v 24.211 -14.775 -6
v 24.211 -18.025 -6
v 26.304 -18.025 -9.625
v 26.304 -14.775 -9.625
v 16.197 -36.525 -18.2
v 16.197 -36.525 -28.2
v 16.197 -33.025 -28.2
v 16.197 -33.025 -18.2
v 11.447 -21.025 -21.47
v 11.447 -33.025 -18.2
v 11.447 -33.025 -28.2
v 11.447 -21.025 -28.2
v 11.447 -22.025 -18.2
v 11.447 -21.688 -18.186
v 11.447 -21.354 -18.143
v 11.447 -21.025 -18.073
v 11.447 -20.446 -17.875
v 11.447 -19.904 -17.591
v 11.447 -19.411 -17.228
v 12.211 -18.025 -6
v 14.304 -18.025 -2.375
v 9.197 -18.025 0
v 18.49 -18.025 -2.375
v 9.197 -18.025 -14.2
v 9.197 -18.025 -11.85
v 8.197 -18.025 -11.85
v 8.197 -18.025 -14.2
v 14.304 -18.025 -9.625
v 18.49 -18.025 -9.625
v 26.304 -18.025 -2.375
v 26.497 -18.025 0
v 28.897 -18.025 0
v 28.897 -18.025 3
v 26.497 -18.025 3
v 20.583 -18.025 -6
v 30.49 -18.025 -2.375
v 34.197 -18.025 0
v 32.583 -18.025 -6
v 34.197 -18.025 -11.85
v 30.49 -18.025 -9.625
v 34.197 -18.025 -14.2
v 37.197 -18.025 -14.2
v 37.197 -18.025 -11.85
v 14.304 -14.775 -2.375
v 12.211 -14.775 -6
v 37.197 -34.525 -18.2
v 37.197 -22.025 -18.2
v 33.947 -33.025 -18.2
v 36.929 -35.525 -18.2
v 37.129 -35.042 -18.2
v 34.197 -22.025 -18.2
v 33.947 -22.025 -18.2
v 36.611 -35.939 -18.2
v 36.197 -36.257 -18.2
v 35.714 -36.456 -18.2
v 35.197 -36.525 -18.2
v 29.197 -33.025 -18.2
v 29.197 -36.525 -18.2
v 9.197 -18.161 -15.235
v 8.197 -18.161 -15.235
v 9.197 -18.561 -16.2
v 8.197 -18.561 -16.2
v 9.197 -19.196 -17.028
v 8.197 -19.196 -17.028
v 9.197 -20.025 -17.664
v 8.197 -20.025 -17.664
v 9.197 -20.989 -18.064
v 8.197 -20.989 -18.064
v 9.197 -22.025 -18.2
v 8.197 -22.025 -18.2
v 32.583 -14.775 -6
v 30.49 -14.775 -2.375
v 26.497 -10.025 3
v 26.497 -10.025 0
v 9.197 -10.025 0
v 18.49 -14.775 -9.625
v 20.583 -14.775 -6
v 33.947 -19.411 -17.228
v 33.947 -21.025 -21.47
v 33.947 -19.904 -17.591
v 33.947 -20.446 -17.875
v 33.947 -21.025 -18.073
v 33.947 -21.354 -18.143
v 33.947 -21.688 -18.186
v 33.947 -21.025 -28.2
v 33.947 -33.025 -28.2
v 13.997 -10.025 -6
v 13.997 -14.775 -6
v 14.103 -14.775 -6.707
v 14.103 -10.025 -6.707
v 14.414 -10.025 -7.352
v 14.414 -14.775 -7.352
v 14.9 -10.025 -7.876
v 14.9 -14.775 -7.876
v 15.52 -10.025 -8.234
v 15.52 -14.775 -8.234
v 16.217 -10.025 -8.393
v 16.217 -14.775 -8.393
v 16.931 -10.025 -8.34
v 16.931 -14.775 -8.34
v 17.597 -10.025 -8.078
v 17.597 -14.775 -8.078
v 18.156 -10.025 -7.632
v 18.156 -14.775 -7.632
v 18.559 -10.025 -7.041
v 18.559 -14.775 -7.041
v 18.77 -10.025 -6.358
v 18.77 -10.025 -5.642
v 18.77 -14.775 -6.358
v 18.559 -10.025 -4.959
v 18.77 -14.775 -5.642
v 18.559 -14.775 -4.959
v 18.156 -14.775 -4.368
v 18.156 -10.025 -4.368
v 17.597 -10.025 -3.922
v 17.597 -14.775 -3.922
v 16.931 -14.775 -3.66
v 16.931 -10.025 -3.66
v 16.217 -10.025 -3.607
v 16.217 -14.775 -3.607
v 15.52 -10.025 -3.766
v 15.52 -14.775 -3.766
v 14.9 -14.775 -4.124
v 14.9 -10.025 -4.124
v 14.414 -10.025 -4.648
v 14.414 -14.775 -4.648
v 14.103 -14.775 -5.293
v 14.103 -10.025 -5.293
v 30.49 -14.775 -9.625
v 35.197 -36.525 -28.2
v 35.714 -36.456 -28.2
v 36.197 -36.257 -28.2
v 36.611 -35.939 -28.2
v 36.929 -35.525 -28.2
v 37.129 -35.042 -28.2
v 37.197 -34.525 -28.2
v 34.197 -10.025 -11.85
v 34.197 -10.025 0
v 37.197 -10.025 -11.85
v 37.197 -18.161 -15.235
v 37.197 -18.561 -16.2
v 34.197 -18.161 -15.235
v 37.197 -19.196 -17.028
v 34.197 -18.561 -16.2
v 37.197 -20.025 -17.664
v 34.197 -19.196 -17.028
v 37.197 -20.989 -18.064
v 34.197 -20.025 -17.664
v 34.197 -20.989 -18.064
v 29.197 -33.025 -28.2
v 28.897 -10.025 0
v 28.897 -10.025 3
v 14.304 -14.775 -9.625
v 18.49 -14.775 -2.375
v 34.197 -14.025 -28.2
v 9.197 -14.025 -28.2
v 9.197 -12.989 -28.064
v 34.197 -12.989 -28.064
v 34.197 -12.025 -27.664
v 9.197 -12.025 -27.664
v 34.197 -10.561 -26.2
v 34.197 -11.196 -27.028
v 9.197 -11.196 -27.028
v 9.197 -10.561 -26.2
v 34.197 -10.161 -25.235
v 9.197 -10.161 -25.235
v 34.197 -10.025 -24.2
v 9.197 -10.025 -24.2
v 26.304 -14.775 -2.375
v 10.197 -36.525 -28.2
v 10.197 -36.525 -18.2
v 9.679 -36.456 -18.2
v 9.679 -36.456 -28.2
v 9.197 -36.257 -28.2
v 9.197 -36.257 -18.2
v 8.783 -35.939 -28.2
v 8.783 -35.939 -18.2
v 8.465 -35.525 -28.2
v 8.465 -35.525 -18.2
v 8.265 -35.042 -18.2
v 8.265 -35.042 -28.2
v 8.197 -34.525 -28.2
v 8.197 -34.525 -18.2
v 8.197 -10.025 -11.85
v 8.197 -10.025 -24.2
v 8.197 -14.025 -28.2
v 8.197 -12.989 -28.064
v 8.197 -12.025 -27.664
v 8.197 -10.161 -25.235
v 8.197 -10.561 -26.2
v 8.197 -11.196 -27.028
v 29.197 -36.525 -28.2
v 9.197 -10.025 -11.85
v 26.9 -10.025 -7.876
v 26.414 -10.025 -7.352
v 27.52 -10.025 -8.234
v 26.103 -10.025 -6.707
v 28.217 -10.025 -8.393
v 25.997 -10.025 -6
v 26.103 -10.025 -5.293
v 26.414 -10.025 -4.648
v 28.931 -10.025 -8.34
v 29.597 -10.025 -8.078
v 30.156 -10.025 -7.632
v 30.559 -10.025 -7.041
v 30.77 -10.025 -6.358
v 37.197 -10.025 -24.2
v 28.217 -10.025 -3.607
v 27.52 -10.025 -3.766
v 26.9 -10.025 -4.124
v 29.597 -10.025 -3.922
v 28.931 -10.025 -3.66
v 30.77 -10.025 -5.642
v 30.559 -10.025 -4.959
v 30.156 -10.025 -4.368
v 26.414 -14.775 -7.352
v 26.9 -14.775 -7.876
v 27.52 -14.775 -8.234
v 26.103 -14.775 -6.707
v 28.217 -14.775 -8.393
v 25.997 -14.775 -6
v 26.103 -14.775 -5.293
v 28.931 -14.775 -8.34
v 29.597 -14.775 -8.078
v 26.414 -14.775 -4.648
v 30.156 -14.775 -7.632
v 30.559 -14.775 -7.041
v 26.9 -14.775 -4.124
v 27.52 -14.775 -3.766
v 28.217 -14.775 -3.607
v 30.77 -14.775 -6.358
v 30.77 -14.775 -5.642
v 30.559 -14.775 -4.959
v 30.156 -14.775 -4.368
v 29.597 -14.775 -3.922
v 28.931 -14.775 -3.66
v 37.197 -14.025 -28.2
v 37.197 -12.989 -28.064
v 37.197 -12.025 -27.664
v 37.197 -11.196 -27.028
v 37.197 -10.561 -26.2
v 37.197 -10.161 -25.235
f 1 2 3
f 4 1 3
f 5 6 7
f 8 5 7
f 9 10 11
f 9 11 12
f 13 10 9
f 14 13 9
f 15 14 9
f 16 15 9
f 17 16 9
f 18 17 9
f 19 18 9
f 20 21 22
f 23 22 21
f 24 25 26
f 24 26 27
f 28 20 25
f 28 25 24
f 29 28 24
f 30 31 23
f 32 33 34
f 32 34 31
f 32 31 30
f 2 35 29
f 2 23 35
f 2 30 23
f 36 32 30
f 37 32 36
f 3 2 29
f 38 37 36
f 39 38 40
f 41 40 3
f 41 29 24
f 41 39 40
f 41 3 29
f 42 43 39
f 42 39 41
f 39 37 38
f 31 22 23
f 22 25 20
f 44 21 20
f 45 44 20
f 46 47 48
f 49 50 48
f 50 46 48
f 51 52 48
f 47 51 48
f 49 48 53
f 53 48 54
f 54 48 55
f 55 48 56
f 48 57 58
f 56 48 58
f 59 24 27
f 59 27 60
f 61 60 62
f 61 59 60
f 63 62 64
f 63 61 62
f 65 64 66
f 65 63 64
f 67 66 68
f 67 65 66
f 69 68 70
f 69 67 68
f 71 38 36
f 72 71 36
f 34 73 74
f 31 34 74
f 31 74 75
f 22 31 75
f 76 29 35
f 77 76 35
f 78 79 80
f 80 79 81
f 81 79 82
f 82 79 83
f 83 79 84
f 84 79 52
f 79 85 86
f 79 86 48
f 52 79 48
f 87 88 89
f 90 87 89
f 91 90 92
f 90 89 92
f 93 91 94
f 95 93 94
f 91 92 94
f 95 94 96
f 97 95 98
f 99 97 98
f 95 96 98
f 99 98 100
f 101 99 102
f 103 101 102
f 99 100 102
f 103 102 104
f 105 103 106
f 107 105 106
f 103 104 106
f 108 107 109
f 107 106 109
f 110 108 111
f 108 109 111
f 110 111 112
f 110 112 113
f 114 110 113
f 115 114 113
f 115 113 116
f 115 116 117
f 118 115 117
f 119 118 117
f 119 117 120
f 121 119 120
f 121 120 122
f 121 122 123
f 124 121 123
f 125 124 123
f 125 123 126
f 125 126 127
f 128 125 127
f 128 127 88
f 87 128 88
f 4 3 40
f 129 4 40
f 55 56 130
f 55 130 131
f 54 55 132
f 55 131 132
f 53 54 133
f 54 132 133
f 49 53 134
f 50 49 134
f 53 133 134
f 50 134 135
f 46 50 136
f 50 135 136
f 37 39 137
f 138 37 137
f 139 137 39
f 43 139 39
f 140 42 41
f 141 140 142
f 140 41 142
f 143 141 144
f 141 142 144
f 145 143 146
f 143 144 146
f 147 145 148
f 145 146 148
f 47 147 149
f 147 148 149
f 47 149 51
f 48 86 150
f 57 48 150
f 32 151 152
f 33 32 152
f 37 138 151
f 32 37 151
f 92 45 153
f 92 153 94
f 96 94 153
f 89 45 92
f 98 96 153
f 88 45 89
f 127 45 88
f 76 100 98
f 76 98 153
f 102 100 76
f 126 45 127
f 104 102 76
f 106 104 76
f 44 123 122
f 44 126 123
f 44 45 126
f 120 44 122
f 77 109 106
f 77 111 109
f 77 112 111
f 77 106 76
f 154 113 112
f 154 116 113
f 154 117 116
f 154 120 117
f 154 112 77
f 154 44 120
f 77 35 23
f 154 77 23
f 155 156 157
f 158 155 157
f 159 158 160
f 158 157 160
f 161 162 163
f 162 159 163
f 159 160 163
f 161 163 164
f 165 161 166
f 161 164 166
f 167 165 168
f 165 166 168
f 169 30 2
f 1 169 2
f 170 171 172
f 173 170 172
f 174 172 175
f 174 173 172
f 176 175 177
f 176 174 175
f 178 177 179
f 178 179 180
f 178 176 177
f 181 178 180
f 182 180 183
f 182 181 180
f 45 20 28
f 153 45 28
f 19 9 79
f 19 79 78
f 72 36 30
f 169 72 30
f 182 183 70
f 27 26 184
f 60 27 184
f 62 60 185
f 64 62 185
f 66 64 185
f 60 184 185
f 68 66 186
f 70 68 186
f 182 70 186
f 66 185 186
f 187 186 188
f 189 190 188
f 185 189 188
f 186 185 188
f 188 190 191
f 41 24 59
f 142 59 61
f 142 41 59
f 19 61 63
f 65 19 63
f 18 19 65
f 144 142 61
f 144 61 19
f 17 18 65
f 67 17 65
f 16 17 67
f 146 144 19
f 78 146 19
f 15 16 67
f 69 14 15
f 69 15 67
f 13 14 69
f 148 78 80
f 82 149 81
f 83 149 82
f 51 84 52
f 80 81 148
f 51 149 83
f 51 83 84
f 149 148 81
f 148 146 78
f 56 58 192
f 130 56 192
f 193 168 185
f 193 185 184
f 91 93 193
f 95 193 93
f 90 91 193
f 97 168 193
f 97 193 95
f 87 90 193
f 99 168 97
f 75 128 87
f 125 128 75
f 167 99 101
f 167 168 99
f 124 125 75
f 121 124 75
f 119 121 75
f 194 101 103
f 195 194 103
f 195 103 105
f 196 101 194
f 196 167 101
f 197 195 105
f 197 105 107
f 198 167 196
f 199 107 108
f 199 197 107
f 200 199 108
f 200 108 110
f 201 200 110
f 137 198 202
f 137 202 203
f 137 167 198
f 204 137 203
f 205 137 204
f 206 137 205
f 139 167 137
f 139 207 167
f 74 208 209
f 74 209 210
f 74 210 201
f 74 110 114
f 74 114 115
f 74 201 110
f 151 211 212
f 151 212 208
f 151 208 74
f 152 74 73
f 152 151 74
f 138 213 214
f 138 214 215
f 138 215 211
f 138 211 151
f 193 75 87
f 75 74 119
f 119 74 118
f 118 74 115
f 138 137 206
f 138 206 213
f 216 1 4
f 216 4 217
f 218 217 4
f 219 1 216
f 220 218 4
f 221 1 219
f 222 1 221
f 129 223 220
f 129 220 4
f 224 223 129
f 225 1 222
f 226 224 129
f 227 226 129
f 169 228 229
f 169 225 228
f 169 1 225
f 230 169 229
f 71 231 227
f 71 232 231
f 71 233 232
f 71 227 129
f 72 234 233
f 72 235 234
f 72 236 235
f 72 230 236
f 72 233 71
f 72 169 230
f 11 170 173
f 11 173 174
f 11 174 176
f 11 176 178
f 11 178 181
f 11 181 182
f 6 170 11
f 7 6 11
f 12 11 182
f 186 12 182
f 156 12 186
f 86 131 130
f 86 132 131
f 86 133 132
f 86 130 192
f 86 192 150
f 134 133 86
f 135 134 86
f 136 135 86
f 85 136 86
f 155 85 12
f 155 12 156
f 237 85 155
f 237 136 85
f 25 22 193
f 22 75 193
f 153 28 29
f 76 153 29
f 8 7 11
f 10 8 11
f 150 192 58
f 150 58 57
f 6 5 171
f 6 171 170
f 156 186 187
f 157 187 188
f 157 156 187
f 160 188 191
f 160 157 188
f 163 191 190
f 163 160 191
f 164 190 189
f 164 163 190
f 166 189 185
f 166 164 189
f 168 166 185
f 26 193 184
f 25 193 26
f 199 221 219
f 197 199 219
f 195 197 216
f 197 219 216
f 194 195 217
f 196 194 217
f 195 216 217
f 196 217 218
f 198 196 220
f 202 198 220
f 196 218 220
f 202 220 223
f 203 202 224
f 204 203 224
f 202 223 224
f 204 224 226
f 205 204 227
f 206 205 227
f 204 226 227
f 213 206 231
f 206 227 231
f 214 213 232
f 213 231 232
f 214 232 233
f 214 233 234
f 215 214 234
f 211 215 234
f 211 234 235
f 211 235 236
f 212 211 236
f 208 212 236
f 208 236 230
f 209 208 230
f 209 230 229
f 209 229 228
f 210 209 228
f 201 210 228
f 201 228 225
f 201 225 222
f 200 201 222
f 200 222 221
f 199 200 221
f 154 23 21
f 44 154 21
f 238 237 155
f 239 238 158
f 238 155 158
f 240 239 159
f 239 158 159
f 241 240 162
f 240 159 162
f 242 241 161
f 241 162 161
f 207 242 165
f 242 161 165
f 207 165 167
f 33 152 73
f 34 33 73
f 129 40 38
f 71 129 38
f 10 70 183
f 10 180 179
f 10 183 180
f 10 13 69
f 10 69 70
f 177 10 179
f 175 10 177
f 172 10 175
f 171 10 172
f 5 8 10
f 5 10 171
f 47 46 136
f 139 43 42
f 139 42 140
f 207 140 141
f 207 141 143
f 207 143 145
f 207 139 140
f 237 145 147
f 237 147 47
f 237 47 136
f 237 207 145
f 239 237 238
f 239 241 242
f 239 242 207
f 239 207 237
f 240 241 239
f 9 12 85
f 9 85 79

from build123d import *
from OCP.BRepFilletAPI import BRepFilletAPI_MakeChamfer
from build123d.topology import SkipClean

# Parameters (mm, degrees)
SKETCH1_R                      = 3.1
SKETCH1_R_2                    = 3.5
SKETCH1_W                      = 32
SKETCH1_H                      = 15.65
BOSS_EXTRUDE1_DEPTH            = 11.7
CUT_EXTRUDE5_DEPTH             = 14
CUT_EXTRUDE8_REACH             = 96.23
SKETCH10_R                     = 1.675
CUT_EXTRUDE8_DIRECTION_2_REACH = 96.23
CUT_EXTRUDE9_REACH             = 94.724
SKETCH11_R                     = 1.625
CUT_EXTRUDE9_DIRECTION_2_REACH = 94.724
CUT_EXTRUDE10_DEPTH            = 2.3
CUT_EXTRUDE11_DEPTH            = 2.3
HOLE1_D                        = 4.8
HOLE1_DEPTH                    = 12
HOLE1_CBORE_D                  = 5.4
HOLE1_CBORE_DEPTH              = 6
CUT_EXTRUDE17_REACH            = 66.001
SKETCH30_W                     = 59.4
SKETCH30_H                     = 25.65
SKETCH32_W                     = 99
SKETCH32_H                     = 8
CUT_EXTRUDE20_DEPTH            = 65.000566192
CHAMFER1_SIZE                  = 6
CHAMFER1_SIZE_2                = 0.3
FILLET1_R                      = 2
SKETCH33_W                     = 2.4
SKETCH33_H                     = 5.3
BOSS_EXTRUDE2_DEPTH            = 3
SKETCH34_W                     = 99
SKETCH34_H                     = 8
CUT_EXTRUDE21_DEPTH            = 61.759087383
CUT_EXTRUDE22_START            = -11.7
CUT_EXTRUDE22_DEPTH            = 11.7
BOSS_EXTRUDE4_DEPTH            = 8
SKETCH37_W                     = 25
SKETCH37_H                     = 8
BOSS_EXTRUDE5_DEPTH            = 16.5
SKETCH39_W                     = 25
SKETCH39_H                     = 10
BOSS_EXTRUDE6_DEPTH            = 15
SKETCH40_W                     = 22.5
SKETCH40_H                     = 12
CUT_EXTRUDE23_DEPTH            = 72.876300078
FILLET2_R                      = 4
CUT_EXTRUDE26_DEPTH            = 67.820749119
SKETCH49_W                     = 5
SKETCH49_H                     = 3.5
SKETCH49_W_2                   = 7
BOSS_EXTRUDE7_DEPTH            = 10
M4_CLEARANCE_HOLE1_D           = 4.8
CUT_EXTRUDE27_DEPTH            = 3.25
BOSS_EXTRUDE9_DEPTH            = 3
CHAMFER2_START                 = 11.446819666
CHAMFER2_DEPTH                 = 22.5
BOSS_EXTRUDE10_START           = -25
BOSS_EXTRUDE10_DEPTH           = 1
FILLET3_R                      = 2


with BuildPart() as part:
    # Sketch1 → Boss-Extrude1 (new body)
    with BuildSketch(Plane.XY):
        Polygon((-43.303180334, 29.275360835), (25.696819666, 29.275360835), (55.696819666, 29.275360835), (55.696819666, -18.024639165), (-43.303180334, -18.024639165), align=None)
        with Locations((-32.303180334, 10.275360835)):
            Circle(SKETCH1_R, mode=Mode.SUBTRACT)
        with Locations((44.696819666, 10.275360835)):
            Circle(SKETCH1_R, mode=Mode.SUBTRACT)
        with Locations((22.696819666, 12.275360835)):
            Circle(SKETCH1_R_2, mode=Mode.SUBTRACT)
        with Locations((-6.803180334, 11.450360835)):
            Rectangle(SKETCH1_W, SKETCH1_H, mode=Mode.SUBTRACT)
    extrude(amount=-BOSS_EXTRUDE1_DEPTH)

    # Sketch7 → Cut-Extrude5 (cut)
    with BuildSketch(Plane.XY):
        with BuildLine():
            Line((-43.303180334, 22.775360835), (-22.503180334, 22.775360835))
            Line((-22.503180334, 22.775360835), (-22.503180334, 3.625360835))
            Line((-22.503180334, 3.625360835), (-24.503180334, 3.625360835))
            Line((-24.503180334, 3.625360835), (-24.503180334, 21.275360835))
            Line((-24.503180334, 21.275360835), (-31.503180334, 21.275360835))
            Line((-31.503180334, 21.275360835), (-31.503180334, 13.270356662))
            ThreePointArc((-31.503180334, 13.270356662), (-32.303180334, 7.175360835), (-33.103180334, 13.270356662))
            Line((-33.103180334, 13.270356662), (-33.103180334, 21.275360835))
            Line((-33.103180334, 21.275360835), (-40.103180334, 21.275360835))
            Line((-40.103180334, 21.275360835), (-40.103180334, 3.625360835))
            Line((-40.103180334, 3.625360835), (-43.303180334, 3.625360835))
            Line((-43.303180334, 3.625360835), (-43.303180334, 22.775360835))
        make_face()
        with BuildLine():
            Line((34.896819666, 22.775360835), (55.696819666, 22.775360835))
            Line((55.696819666, 22.775360835), (55.696819666, 3.625360835))
            Line((55.696819666, 3.625360835), (52.496819666, 3.625360835))
            Line((52.496819666, 3.625360835), (52.496819666, 21.275360835))
            Line((52.496819666, 21.275360835), (45.496819666, 21.275360835))
            Line((45.496819666, 21.275360835), (45.496819666, 13.270356662))
            ThreePointArc((45.496819666, 13.270356662), (44.696819666, 7.175360835), (43.896819666, 13.270356662))
            Line((43.896819666, 13.270356662), (43.896819666, 21.275360835))
            Line((43.896819666, 21.275360835), (36.896819666, 21.275360835))
            Line((36.896819666, 21.275360835), (36.896819666, 3.625360835))
            Line((36.896819666, 3.625360835), (34.896819666, 3.625360835))
            Line((34.896819666, 3.625360835), (34.896819666, 22.775360835))
        make_face()
    extrude(amount=-CUT_EXTRUDE5_DEPTH, mode=Mode.SUBTRACT)

    # Sketch10 → Cut-Extrude8 (cut, up to next)
    with BuildSketch(Plane(origin=(-33.103180334, 0, 0), x_dir=(0, 0, -1), z_dir=(1, 0, 0)), mode=Mode.PRIVATE) as cut_extrude8_sk1:
        with Locations(Location((5.85, 17.272858748, 0), (0, 0, 270))):
            Circle(SKETCH10_R)
    cut_extrude8_tool1 = extrude(cut_extrude8_sk1.sketch, amount=-CUT_EXTRUDE8_REACH, mode=Mode.PRIVATE) & part.part
    add(cut_extrude8_tool1.solids().sort_by_distance((-33.10318, 17.272859, -5.85))[0], mode=Mode.SUBTRACT)

    # Sketch10 → Cut-Extrude8 direction 2 (cut, up to next)
    with BuildSketch(Plane(origin=(-33.103180334, 0, 0), x_dir=(0, 0, -1), z_dir=(1, 0, 0)), mode=Mode.PRIVATE) as cut_extrude8_direction_2_sk1:
        with Locations(Location((5.85, 17.272858748, 0), (0, 0, 270))):
            Circle(SKETCH10_R)
    cut_extrude8_direction_2_tool1 = extrude(cut_extrude8_direction_2_sk1.sketch, amount=CUT_EXTRUDE8_DIRECTION_2_REACH, mode=Mode.PRIVATE) & part.part
    add(cut_extrude8_direction_2_tool1.solids().sort_by_distance((-33.10318, 17.272859, -5.85))[0], mode=Mode.SUBTRACT)

    # Sketch11 → Cut-Extrude9 (cut, up to next)
    with BuildSketch(Plane(origin=(43.896819666, 0, 0), x_dir=(0, 0, -1), z_dir=(1, 0, 0)), mode=Mode.PRIVATE) as cut_extrude9_sk1:
        with Locations(Location((5.85, 17.272858748, 0), (0, 0, 180))):
            Circle(SKETCH11_R)
    cut_extrude9_tool1 = extrude(cut_extrude9_sk1.sketch, amount=-CUT_EXTRUDE9_REACH, mode=Mode.PRIVATE) & part.part
    add(cut_extrude9_tool1.solids().sort_by_distance((43.89682, 17.272859, -5.85))[0], mode=Mode.SUBTRACT)

    # Sketch11 → Cut-Extrude9 direction 2 (cut, up to next)
    with BuildSketch(Plane(origin=(43.896819666, 0, 0), x_dir=(0, 0, -1), z_dir=(1, 0, 0)), mode=Mode.PRIVATE) as cut_extrude9_direction_2_sk1:
        with Locations(Location((5.85, 17.272858748, 0), (0, 0, 180))):
            Circle(SKETCH11_R)
    cut_extrude9_direction_2_tool1 = extrude(cut_extrude9_direction_2_sk1.sketch, amount=CUT_EXTRUDE9_DIRECTION_2_REACH, mode=Mode.PRIVATE) & part.part
    add(cut_extrude9_direction_2_tool1.solids().sort_by_distance((43.89682, 17.272859, -5.85))[0], mode=Mode.SUBTRACT)

    # Sketch12 → Cut-Extrude10 (cut)
    with BuildSketch(Plane.ZY.offset(-36.896819666)):
        Polygon((-4.146816706, 20.222858748), (0, 20.222858748), (0, 14.322858748), (-4.146816706, 14.322858748), (-7.553183294, 14.322858748), (-9.256366588, 17.272858748), (-7.553183294, 20.222858748), align=None)
    extrude(amount=-CUT_EXTRUDE10_DEPTH, mode=Mode.SUBTRACT)

    # Sketch13 → Cut-Extrude11 (cut)
    with BuildSketch(Plane(origin=(-24.503180334, 0, 0), x_dir=(0, 0, -1), z_dir=(1, 0, 0))):
        Polygon((4.146816706, 20.222858748), (0, 20.222858748), (0, 14.322858748), (4.146816706, 14.322858748), (7.553183294, 14.322858748), (9.256366588, 17.272858748), (7.553183294, 20.222858748), align=None)
    extrude(amount=-CUT_EXTRUDE11_DEPTH, mode=Mode.SUBTRACT)

    # Hole1
    with Locations(Plane(origin=(0, 3.625360835, 0), x_dir=(1, 0, 0), z_dir=(0, 1, 0))):
        with Locations((-15.653180334, 5.85), (0.346819666, 5.85)):
            CounterBoreHole(HOLE1_D / 2, HOLE1_CBORE_D / 2, HOLE1_CBORE_DEPTH, depth=HOLE1_DEPTH)

    # Sketch30 → Cut-Extrude17 (cut, up to next)
    with BuildSketch(Plane(origin=(0, 0, -11.7), x_dir=(-1, 0, 0), z_dir=(0, 0, -1)), mode=Mode.PRIVATE) as cut_extrude17_sk1:
        with Locations((-5.196819666, 16.450360835)):
            Rectangle(SKETCH30_W, SKETCH30_H)
    cut_extrude17_tool1 = extrude(cut_extrude17_sk1.sketch, amount=-CUT_EXTRUDE17_REACH, mode=Mode.PRIVATE) & part.part
    add(cut_extrude17_tool1.solids().sort_by_distance((5.19682, 16.450361, -11.7))[0], mode=Mode.SUBTRACT)


with BuildPart() as cut_extrude17_piece_1:
    # of the separate pieces the step leaves, piece 1, a body of its own (cut_extrude17_pieces)
    add(part.part.solids().sort_by_distance((-24.503180334, 3.625360835, 0))[0])

    # Chamfer1
    chamfer1_edges_1 = [cut_extrude17_piece_1.edges().sort_by_distance(p)[0] for p in [
        (-2.353180334, -2.374639165, -5.85),
    ]]
    chamfer1_side_1 = [cut_extrude17_piece_1.faces().sort_by_distance(p)[0] for p in [
        (-2.353180334, -2.368639165, -5.85),
    ]]
    chamfer1_edges_2 = [cut_extrude17_piece_1.edges().sort_by_distance(p)[0] for p in [
        (-18.353180334, -2.374639165, -5.85),
    ]]
    chamfer1_side_2 = [cut_extrude17_piece_1.faces().sort_by_distance(p)[0] for p in [
        (-18.353180334, -2.368639165, -5.85),
    ]]
    chamfer1 = BRepFilletAPI_MakeChamfer(cut_extrude17_piece_1.part.solid().wrapped)
    for e in chamfer1_edges_1:
        chamfer1.Add(CHAMFER1_SIZE - 0.0001, CHAMFER1_SIZE_2 - 0.0001, e.wrapped, chamfer1_side_1[0].wrapped)
    for e in chamfer1_edges_2:
        chamfer1.Add(CHAMFER1_SIZE - 0.0001, CHAMFER1_SIZE_2 - 0.0001, e.wrapped, chamfer1_side_2[0].wrapped)
    add(Compound.cast(chamfer1.Shape()), mode=Mode.REPLACE)  # a hair under: the kernel refuses the full size

    # Fillet1
    # the kernel refuses this fillet: 2 mm, written as the material it takes off along each edge
    with BuildSketch(Plane(origin=(50.496819666, 19.275360835, -2), x_dir=(1, 0, 0), z_dir=(0, 1, 0))) as fillet1_piece_1_section:
        Polygon((0, 0), (FILLET1_R, 0), (FILLET1_R, -FILLET1_R), (0, -FILLET1_R), align=None)
    fillet1_piece_1 = extrude(amount=FILLET1_R, mode=Mode.PRIVATE)
    fillet1_piece_1 = fillet1_piece_1 - Plane(origin=(50.496819666, 19.275360835, -2), x_dir=(-0.7071067811865475, 0, -0.7071067811865475), z_dir=(0, 1, 0)) * Sphere(FILLET1_R, mode=Mode.PRIVATE)
    add(fillet1_piece_1, mode=Mode.SUBTRACT)
    with BuildSketch(Plane(origin=(50.496819666, 19.275360835, -9.7), x_dir=(1, 0, 0), z_dir=(0, 1, 0))) as fillet1_piece_2_section:
        Polygon((0, 0), (FILLET1_R, 0), (FILLET1_R, FILLET1_R), (0, FILLET1_R), align=None)
    fillet1_piece_2 = extrude(amount=FILLET1_R, mode=Mode.PRIVATE)
    fillet1_piece_2 = fillet1_piece_2 - Plane(origin=(50.496819666, 19.275360835, -9.7), x_dir=(-0.7071067811865475, 0, 0.7071067811865475), z_dir=(0, 1, 0)) * Sphere(FILLET1_R, mode=Mode.PRIVATE)
    add(fillet1_piece_2, mode=Mode.SUBTRACT)
    with BuildSketch(Plane(origin=(38.896819666, 19.275360835, -9.7), x_dir=(-1, 0, 0), z_dir=(0, 0, -1))) as fillet1_piece_3_section:
        Polygon((0, 0), (FILLET1_R, 0), (FILLET1_R, FILLET1_R), (0, FILLET1_R), align=None)
    fillet1_piece_3 = extrude(amount=FILLET1_R, mode=Mode.PRIVATE)
    fillet1_piece_3 = fillet1_piece_3 - Plane(origin=(38.896819666, 19.275360835, -9.7), x_dir=(0.7071067811865475, -0.7071067811865475, 0), z_dir=(0, 0, -1)) * Sphere(FILLET1_R, mode=Mode.PRIVATE)
    add(fillet1_piece_3, mode=Mode.SUBTRACT)
    with BuildSketch(Plane(origin=(-38.103180334, 19.275360835, -2), x_dir=(0, 1, 0), z_dir=(-1, 0, 0))) as fillet1_piece_4_section:
        Polygon((0, 0), (FILLET1_R, 0), (FILLET1_R, -FILLET1_R), (0, -FILLET1_R), align=None)
    fillet1_piece_4 = extrude(amount=FILLET1_R, mode=Mode.PRIVATE)
    fillet1_piece_4 = fillet1_piece_4 - Plane(origin=(-38.103180334, 19.275360835, -2), x_dir=(0, -0.7071067811865475, -0.7071067811865475), z_dir=(-1, 0, 0)) * Sphere(FILLET1_R, mode=Mode.PRIVATE)
    add(fillet1_piece_4, mode=Mode.SUBTRACT)
    with BuildSketch(Plane(origin=(-38.103180334, 19.275360835, -9.7), x_dir=(0, 1, 0), z_dir=(-1, 0, 0))) as fillet1_piece_5_section:
        Polygon((0, 0), (FILLET1_R, 0), (FILLET1_R, FILLET1_R), (0, FILLET1_R), align=None)
    fillet1_piece_5 = extrude(amount=FILLET1_R, mode=Mode.PRIVATE)
    fillet1_piece_5 = fillet1_piece_5 - Plane(origin=(-38.103180334, 19.275360835, -9.7), x_dir=(0, -0.7071067811865475, 0.7071067811865475), z_dir=(-1, 0, 0)) * Sphere(FILLET1_R, mode=Mode.PRIVATE)
    add(fillet1_piece_5, mode=Mode.SUBTRACT)
    with BuildSketch(Plane(origin=(-26.503180334, 19.275360835, -9.7), x_dir=(0, 0, -1), z_dir=(1, 0, 0))) as fillet1_piece_6_section:
        Polygon((0, 0), (FILLET1_R, 0), (FILLET1_R, FILLET1_R), (0, FILLET1_R), align=None)
    fillet1_piece_6 = extrude(amount=FILLET1_R, mode=Mode.PRIVATE)
    fillet1_piece_6 = fillet1_piece_6 - Plane(origin=(-26.503180334, 19.275360835, -9.7), x_dir=(0, -0.7071067811865475, 0.7071067811865475), z_dir=(1, 0, 0)) * Sphere(FILLET1_R, mode=Mode.PRIVATE)
    add(fillet1_piece_6, mode=Mode.SUBTRACT)
    with BuildSketch(Plane(origin=(52.496819666, 21.275360835, -2), x_dir=(-1, 0, 0), z_dir=(0, 0, -1)), Plane(origin=(-40.103180334, 21.275360835, -2), x_dir=(0, -1, 0), z_dir=(0, 0, -1))) as fillet1_piece_7:
        with BuildLine():
            CenterArc((FILLET1_R, -FILLET1_R), FILLET1_R, 90, 90)
            Line((0, -FILLET1_R), (0, 0))
            Line((0, 0), (FILLET1_R, 0))
        make_face()
    extrude(amount=7.7, mode=Mode.SUBTRACT)
    with BuildSketch(Plane(origin=(50.496819666, 21.275360835, 0), x_dir=(0, -1, 0), z_dir=(-1, 0, 0)), Plane(origin=(40.496819666, 21.275360835, -11.7), x_dir=(0, -1, 0), z_dir=(1, 0, 0)), Plane(origin=(38.896819666, 21.275360835, -11.7), x_dir=(0, -1, 0), z_dir=(1, 0, 0)), Plane(origin=(-28.103180334, 21.275360835, 0), x_dir=(0, -1, 0), z_dir=(-1, 0, 0)), Plane(origin=(-38.103180334, 21.275360835, -11.7), x_dir=(0, -1, 0), z_dir=(1, 0, 0)), Plane(origin=(-36.503180334, 21.275360835, -11.7), x_dir=(0, -1, 0), z_dir=(1, 0, 0))) as fillet1_piece_8:
        with BuildLine():
            CenterArc((FILLET1_R, -FILLET1_R), FILLET1_R, 90, 90)
            Line((0, -FILLET1_R), (0, 0))
            Line((0, 0), (FILLET1_R, 0))
        make_face()
    extrude(amount=10, mode=Mode.SUBTRACT)
    with BuildSketch(Plane(origin=(45.496819666, 21.275360835, 5), x_dir=(0, -1, 0), z_dir=(0, 0, -1)), Plane(origin=(43.896819666, 21.275360835, 5), x_dir=(-1, 0, 0), z_dir=(0, 0, -1)), Plane(origin=(-33.103180334, 21.275360835, 5), x_dir=(-1, 0, 0), z_dir=(0, 0, -1)), Plane(origin=(55.696819666, 3.625360835, 5), x_dir=(-1, 0, 0), z_dir=(0, 0, -1)), Plane(origin=(-43.303180334, 3.625360835, 5), x_dir=(0, -1, 0), z_dir=(0, 0, -1))) as fillet1_piece_9:
        with BuildLine():
            CenterArc((FILLET1_R, -FILLET1_R), FILLET1_R, 90, 90)
            Line((0, -FILLET1_R), (0, 0))
            Line((0, 0), (FILLET1_R, 0))
        make_face()
    extrude(amount=21.7, mode=Mode.SUBTRACT)
    with BuildSketch(Plane(origin=(48.896819666, 21.275360835, 0), x_dir=(0, -1, 0), z_dir=(-1, 0, 0)), Plane(origin=(-19.503180334, 21.275360835, 0), x_dir=(0, -1, 0), z_dir=(-1, 0, 0))) as fillet1_piece_10:
        with BuildLine():
            CenterArc((FILLET1_R, -FILLET1_R), FILLET1_R, 90, 90)
            Line((0, -FILLET1_R), (0, 0))
            Line((0, 0), (FILLET1_R, 0))
        make_face()
    extrude(amount=17, mode=Mode.SUBTRACT)
    with BuildSketch(Plane(origin=(36.896819666, 21.275360835, 5), x_dir=(0, -1, 0), z_dir=(0, 0, -1))) as fillet1_piece_11:
        with BuildLine():
            CenterArc((FILLET1_R, -FILLET1_R), FILLET1_R, 90, 90)
            Line((0, -FILLET1_R), (0, 0))
            Line((0, 0), (FILLET1_R, 0))
        make_face()
    extrude(amount=14.7, mode=Mode.SUBTRACT)
    with BuildSketch(Plane(origin=(-24.503180334, 21.275360835, 5), x_dir=(0, -1, 0), z_dir=(0, 0, -1))) as fillet1_piece_12:
        with BuildLine():
            CenterArc((FILLET1_R, FILLET1_R), FILLET1_R, 180, 90)
            Line((0, FILLET1_R), (0, 0))
            Line((0, 0), (FILLET1_R, 0))
        make_face()
    extrude(amount=14.7, mode=Mode.SUBTRACT)
    with BuildSketch(Plane(origin=(-31.503180334, 21.275360835, 5), x_dir=(1, 0, 0), z_dir=(0, 0, -1))) as fillet1_piece_13:
        with BuildLine():
            CenterArc((FILLET1_R, FILLET1_R), FILLET1_R, 180, 90)
            Line((0, FILLET1_R), (0, 0))
            Line((0, 0), (FILLET1_R, 0))
        make_face()
    extrude(amount=21.7, mode=Mode.SUBTRACT)
    with BuildSketch(Plane(origin=(55.696819666, 8.625360835, 0), x_dir=(-1, 0, 0), z_dir=(0, -1, 0)), Plane(origin=(-43.303180334, -23.024639165, 0), x_dir=(1, 0, 0), z_dir=(0, 1, 0))) as fillet1_piece_14:
        with BuildLine():
            CenterArc((FILLET1_R, FILLET1_R), FILLET1_R, 180, 90)
            Line((0, FILLET1_R), (0, 0))
            Line((0, 0), (FILLET1_R, 0))
        make_face()
    extrude(amount=31.65, mode=Mode.SUBTRACT)
    with BuildSketch(Plane(origin=(55.696819666, 8.625360835, -11.7), x_dir=(-1, 0, 0), z_dir=(0, -1, 0)), Plane(origin=(-43.303180334, -23.024639165, -11.7), x_dir=(1, 0, 0), z_dir=(0, 1, 0))) as fillet1_piece_15:
        with BuildLine():
            CenterArc((FILLET1_R, -FILLET1_R), FILLET1_R, 90, 90)
            Line((0, -FILLET1_R), (0, 0))
            Line((0, 0), (FILLET1_R, 0))
        make_face()
    extrude(amount=31.65, mode=Mode.SUBTRACT)
    with BuildSketch(Plane(origin=(36.896819666, 3.625360835, -11.7), x_dir=(0, 0, 1), z_dir=(-1, 0, 0))) as fillet1_piece_16:
        with BuildLine():
            CenterArc((FILLET1_R, -FILLET1_R), FILLET1_R, 90, 90)
            Line((0, -FILLET1_R), (0, 0))
            Line((0, 0), (FILLET1_R, 0))
        make_face()
    extrude(amount=61.4, mode=Mode.SUBTRACT)
    with BuildSketch(Plane(origin=(36.896819666, 3.625360835, 0), x_dir=(0, 0, -1), z_dir=(-1, 0, 0))) as fillet1_piece_17:
        with BuildLine():
            CenterArc((FILLET1_R, FILLET1_R), FILLET1_R, 180, 90)
            Line((0, FILLET1_R), (0, 0))
            Line((0, 0), (FILLET1_R, 0))
        make_face()
    extrude(amount=61.4, mode=Mode.SUBTRACT)
    with BuildSketch(Plane(origin=(36.896819666, 19.322858748, 0), x_dir=(0, 0, -1), z_dir=(0, -1, 0)), Plane(origin=(-24.503180334, 3.625360835, 0), x_dir=(0, 0, -1), z_dir=(0, 1, 0))) as fillet1_piece_18:
        with BuildLine():
            CenterArc((FILLET1_R, FILLET1_R), FILLET1_R, 180, 90)
            Line((0, FILLET1_R), (0, 0))
            Line((0, 0), (FILLET1_R, 0))
        make_face()
    extrude(amount=15.697497913, mode=Mode.SUBTRACT)
    with BuildSketch(Plane(origin=(52.496819666, 3.625360835, 0), x_dir=(-1, 0, 0), z_dir=(0, 1, 0)), Plane(origin=(36.896819666, 3.625360835, -11.7), x_dir=(1, 0, 0), z_dir=(0, 1, 0)), Plane(origin=(52.496819666, 19.275360835, -11.7), x_dir=(-1, 0, 0), z_dir=(0, -1, 0)), Plane(origin=(-40.103180334, 19.275360835, 0), x_dir=(1, 0, 0), z_dir=(0, -1, 0)), Plane(origin=(-40.103180334, 3.625360835, -11.7), x_dir=(1, 0, 0), z_dir=(0, 1, 0))) as fillet1_piece_19:
        with BuildLine():
            CenterArc((FILLET1_R, -FILLET1_R), FILLET1_R, 90, 90)
            Line((0, -FILLET1_R), (0, 0))
            Line((0, 0), (FILLET1_R, 0))
        make_face()
    extrude(amount=15.65, mode=Mode.SUBTRACT)
    with BuildSketch(Plane(origin=(-24.503180334, 19.275360835, -11.7), x_dir=(0, 0, 1), z_dir=(0, -1, 0))) as fillet1_piece_20:
        with BuildLine():
            CenterArc((FILLET1_R, FILLET1_R), FILLET1_R, 180, 90)
            Line((0, FILLET1_R), (0, 0))
            Line((0, 0), (FILLET1_R, 0))
        make_face()
    extrude(amount=15.65, mode=Mode.SUBTRACT)
    with BuildSketch(Plane(origin=(41.896819666, 3.625360835, -11.7), x_dir=(0, 0, 1), z_dir=(-1, 0, 0))) as fillet1_piece_21a_section:
        with BuildLine():
            CenterArc((FILLET1_R, -FILLET1_R), FILLET1_R, 90, 90)
            Line((0, -FILLET1_R), (0, 0))
            Line((0, 0), (FILLET1_R, 0))
        make_face()
    fillet1_piece_21a = extrude(amount=66.4, mode=Mode.PRIVATE)
    fillet1_piece_21a = split(fillet1_piece_21a, bisect_by=Plane(origin=(36.896819666, 3.625360835, -11.7), z_dir=(1, 0, 0)), keep=Keep.TOP, mode=Mode.PRIVATE)
    with BuildSketch(Plane(origin=(36.896819666, -1.374639165, -11.7), x_dir=(1, 0, 0), z_dir=(0, 1, 0))) as fillet1_piece_21b_section:
        with BuildLine():
            CenterArc((FILLET1_R, -FILLET1_R), FILLET1_R, 90, 90)
            Line((0, -FILLET1_R), (0, 0))
            Line((0, 0), (FILLET1_R, 0))
        make_face()
    fillet1_piece_21b = extrude(amount=20.65, mode=Mode.PRIVATE)
    fillet1_piece_21b = split(fillet1_piece_21b, bisect_by=Plane(origin=(36.896819666, 3.625360835, -11.7), z_dir=(0, -1, 0)), keep=Keep.TOP, mode=Mode.PRIVATE)
    fillet1_piece_21 = fillet1_piece_21a & fillet1_piece_21b
    add(fillet1_piece_21, mode=Mode.SUBTRACT)
    with BuildSketch(Plane(origin=(36.896819666, 3.625360835, -11.7), x_dir=(0, 0, 1), z_dir=(-1, 0, 0))) as fillet1_piece_22a_section:
        with BuildLine():
            CenterArc((FILLET1_R, -FILLET1_R), FILLET1_R, 90, 90)
            Line((0, -FILLET1_R), (0, 0))
            Line((0, 0), (FILLET1_R, 0))
        make_face()
    fillet1_piece_22a = extrude(amount=66.4, mode=Mode.PRIVATE)
    fillet1_piece_22a = split(fillet1_piece_22a, bisect_by=Plane(origin=(-24.503180334, 3.625360835, -11.7), z_dir=(-1, 0, 0)), keep=Keep.TOP, mode=Mode.PRIVATE)
    with BuildSketch(Plane(origin=(-24.503180334, 19.275360835, -11.7), x_dir=(0, 0, 1), z_dir=(0, -1, 0))) as fillet1_piece_22b_section:
        with BuildLine():
            CenterArc((FILLET1_R, FILLET1_R), FILLET1_R, 180, 90)
            Line((0, FILLET1_R), (0, 0))
            Line((0, 0), (FILLET1_R, 0))
        make_face()
    fillet1_piece_22b = extrude(amount=20.65, mode=Mode.PRIVATE)
    fillet1_piece_22b = split(fillet1_piece_22b, bisect_by=Plane(origin=(-24.503180334, 3.625360835, -11.7), z_dir=(0, -1, 0)), keep=Keep.TOP, mode=Mode.PRIVATE)
    fillet1_piece_22 = fillet1_piece_22a & fillet1_piece_22b
    add(fillet1_piece_22, mode=Mode.SUBTRACT)
    with BuildSketch(Plane(origin=(41.896819666, 3.625360835, 0), x_dir=(0, 0, -1), z_dir=(-1, 0, 0))) as fillet1_piece_23a_section:
        with BuildLine():
            CenterArc((FILLET1_R, FILLET1_R), FILLET1_R, 180, 90)
            Line((0, FILLET1_R), (0, 0))
            Line((0, 0), (FILLET1_R, 0))
        make_face()
    fillet1_piece_23a = extrude(amount=66.4, mode=Mode.PRIVATE)
    fillet1_piece_23a = split(fillet1_piece_23a, bisect_by=Plane(origin=(36.896819666, 3.625360835, 0), z_dir=(1, 0, 0)), keep=Keep.TOP, mode=Mode.PRIVATE)
    with BuildSketch(Plane(origin=(36.896819666, 19.322858748, 0), x_dir=(0, 0, -1), z_dir=(0, -1, 0))) as fillet1_piece_23b_section:
        with BuildLine():
            CenterArc((FILLET1_R, FILLET1_R), FILLET1_R, 180, 90)
            Line((0, FILLET1_R), (0, 0))
            Line((0, 0), (FILLET1_R, 0))
        make_face()
    fillet1_piece_23b = extrude(amount=20.697497913, mode=Mode.PRIVATE)
    fillet1_piece_23b = split(fillet1_piece_23b, bisect_by=Plane(origin=(36.896819666, 3.625360835, 0), z_dir=(0, -1, 0)), keep=Keep.TOP, mode=Mode.PRIVATE)
    fillet1_piece_23 = fillet1_piece_23a & fillet1_piece_23b
    add(fillet1_piece_23, mode=Mode.SUBTRACT)
    with BuildSketch(Plane(origin=(36.896819666, 3.625360835, 0), x_dir=(0, 0, -1), z_dir=(-1, 0, 0))) as fillet1_piece_24a_section:
        with BuildLine():
            CenterArc((FILLET1_R, FILLET1_R), FILLET1_R, 180, 90)
            Line((0, FILLET1_R), (0, 0))
            Line((0, 0), (FILLET1_R, 0))
        make_face()
    fillet1_piece_24a = extrude(amount=66.4, mode=Mode.PRIVATE)
    fillet1_piece_24a = split(fillet1_piece_24a, bisect_by=Plane(origin=(-24.503180334, 3.625360835, 0), z_dir=(-1, 0, 0)), keep=Keep.TOP, mode=Mode.PRIVATE)
    with BuildSketch(Plane(origin=(-24.503180334, -1.374639165, 0), x_dir=(0, 0, -1), z_dir=(0, 1, 0))) as fillet1_piece_24b_section:
        with BuildLine():
            CenterArc((FILLET1_R, FILLET1_R), FILLET1_R, 180, 90)
            Line((0, FILLET1_R), (0, 0))
            Line((0, 0), (FILLET1_R, 0))
        make_face()
    fillet1_piece_24b = extrude(amount=20.697497913, mode=Mode.PRIVATE)
    fillet1_piece_24b = split(fillet1_piece_24b, bisect_by=Plane(origin=(-24.503180334, 3.625360835, 0), z_dir=(0, -1, 0)), keep=Keep.TOP, mode=Mode.PRIVATE)
    fillet1_piece_24 = fillet1_piece_24a & fillet1_piece_24b
    add(fillet1_piece_24, mode=Mode.SUBTRACT)

    # Sketch33 → Boss-Extrude2 (add)
    with BuildSketch(Plane.XY):
        with Locations((27.696819666, -7.374639165)):
            Rectangle(SKETCH33_W, SKETCH33_H)
    extrude(amount=BOSS_EXTRUDE2_DEPTH)

    # Sketch34 → Cut-Extrude21 (cut, through all)
    with BuildSketch(Plane.XY):
        with Locations((6.196819666, -14.024639165)):
            Rectangle(SKETCH34_W, SKETCH34_H)
    extrude(amount=-CUT_EXTRUDE21_DEPTH, mode=Mode.SUBTRACT)

    # Sketch35 → Cut-Extrude22 (cut)
    with BuildSketch(Plane.XY.offset(CUT_EXTRUDE22_START)):
        Polygon((17.396819666, 3.625360835), (28.359065589, 3.625360835), (34.396819666, 3.625360835), (34.396819666, -4.374639165), (10.396819666, -4.374639165), (10.396819666, 1.625360835), (10.396819666, 3.625360835), align=None)
    extrude(amount=CUT_EXTRUDE22_DEPTH, mode=Mode.SUBTRACT)

    # Sketch36 → Boss-Extrude4 (add)
    with SkipClean():  # the faces are left unmerged after this step: merging them gives an invalid solid
        with BuildSketch(Plane.XZ.offset(10.024639165)):
            with BuildLine():
                Line((26.496819666, 3), (26.496819666, 0))
                Line((26.496819666, 0), (-41.303180334, 0))
                ThreePointArc((-41.303180334, 0), (-42.717393896, -0.585786438), (-43.303180334, -2))
                Line((-43.303180334, -2), (-43.303180334, -9.7))
                ThreePointArc((-43.303180334, -9.7), (-42.717393896, -11.114213562), (-41.303180334, -11.7))
                Line((-41.303180334, -11.7), (53.696819666, -11.7))
                ThreePointArc((53.696819666, -11.7), (55.111033228, -11.114213562), (55.696819666, -9.7))
                Line((55.696819666, -9.7), (55.696819666, -2))
                ThreePointArc((55.696819666, -2), (55.111033228, -0.585786438), (53.696819666, 0))
                Line((53.696819666, 0), (28.896819666, 0))
                Line((28.896819666, 0), (28.896819666, 3))
                Line((28.896819666, 3), (26.496819666, 3))
            make_face()
        extrude(amount=BOSS_EXTRUDE4_DEPTH)

    # Sketch37 → Boss-Extrude5 (add)
    with SkipClean():  # the faces are left unmerged after this step: merging them gives an invalid solid
        with BuildSketch(Plane(origin=(0, 0, -11.7), x_dir=(-1, 0, 0), z_dir=(0, 0, -1))):
            with Locations((-21.696819666, -14.024639165)):
                Rectangle(SKETCH37_W, SKETCH37_H)
        extrude(amount=BOSS_EXTRUDE5_DEPTH)

    # Sketch39 → Boss-Extrude6 (add)
    with SkipClean():  # the faces are left unmerged after this step: merging them gives an invalid solid
        with BuildSketch(Plane.XZ.offset(18.024639165)):
            with Locations((21.696819666, -23.2)):
                Rectangle(SKETCH39_W, SKETCH39_H)
        extrude(amount=BOSS_EXTRUDE6_DEPTH)

    # Sketch40 → Cut-Extrude23 (cut, through all)
    with SkipClean():  # the faces are left unmerged after this step: merging them gives an invalid solid
        with BuildSketch(Plane(origin=(0, 0, -28.2), x_dir=(-1, 0, 0), z_dir=(0, 0, -1))):
            with Locations((-22.696819666, -27.024639165)):
                Rectangle(SKETCH40_W, SKETCH40_H)
        extrude(amount=-CUT_EXTRUDE23_DEPTH, mode=Mode.SUBTRACT)

    # Fillet2
    # the kernel refuses this fillet: 4 mm, written as the material it adds along each edge
    with BuildSketch(Plane(origin=(34.196819666, -18.024639165, -18.2), x_dir=(0, 0, 1), z_dir=(-1, 0, 0))) as fillet2_piece_1_section:
        with BuildLine():
            CenterArc((FILLET2_R, -FILLET2_R), FILLET2_R, 90, 90)
            Line((0, -FILLET2_R), (0, 0))
            Line((0, 0), (FILLET2_R, 0))
        make_face()
    fillet2_piece_1 = extrude(amount=25, mode=Mode.PRIVATE)
    fillet2_piece_1 = split(fillet2_piece_1, bisect_by=Plane(origin=(34.196819666, -21.024639165, -18.2), z_dir=(0, 1, 0)), keep=Keep.TOP, mode=Mode.PRIVATE)
    fillet2_piece_1 = split(fillet2_piece_1, bisect_by=Plane(origin=(33.946819666, -18.024639165, -18.2), z_dir=(1, 0, 0)), keep=Keep.TOP, mode=Mode.PRIVATE)
    add(fillet2_piece_1)
    with BuildSketch(Plane(origin=(34.196819666, -18.024639165, -18.2), x_dir=(0, 0, 1), z_dir=(-1, 0, 0))) as fillet2_piece_2_section:
        with BuildLine():
            CenterArc((FILLET2_R, -FILLET2_R), FILLET2_R, 90, 90)
            Line((0, -FILLET2_R), (0, 0))
            Line((0, 0), (FILLET2_R, 0))
        make_face()
    fillet2_piece_2 = extrude(amount=25, mode=Mode.PRIVATE)
    fillet2_piece_2 = split(fillet2_piece_2, bisect_by=Plane(origin=(34.196819666, -21.024639165, -18.2), z_dir=(0, -1, 0)), keep=Keep.TOP, mode=Mode.PRIVATE)
    fillet2_piece_2 = split(fillet2_piece_2, bisect_by=Plane(origin=(33.946819666, -18.024639165, -18.2), z_dir=(1, 0, 0)), keep=Keep.TOP, mode=Mode.PRIVATE)
    add(fillet2_piece_2)
    with BuildSketch(Plane(origin=(34.196819666, -18.024639165, -18.2), x_dir=(0, 0, 1), z_dir=(-1, 0, 0))) as fillet2_piece_3_section:
        with BuildLine():
            CenterArc((FILLET2_R, -FILLET2_R), FILLET2_R, 90, 90)
            Line((0, -FILLET2_R), (0, 0))
            Line((0, 0), (FILLET2_R, 0))
        make_face()
    fillet2_piece_3 = extrude(amount=25, mode=Mode.PRIVATE)
    fillet2_piece_3 = split(fillet2_piece_3, bisect_by=Plane(origin=(11.446819666, -18.024639165, -18.2), z_dir=(1, 0, 0)), keep=Keep.TOP, mode=Mode.PRIVATE)
    fillet2_piece_3 = split(fillet2_piece_3, bisect_by=Plane(origin=(34.196819666, -21.024639165, -18.2), z_dir=(0, 1, 0)), keep=Keep.TOP, mode=Mode.PRIVATE)
    fillet2_piece_3 = split(fillet2_piece_3, bisect_by=Plane(origin=(33.946819666, -18.024639165, -18.2), z_dir=(-1, 0, 0)), keep=Keep.TOP, mode=Mode.PRIVATE)
    add(fillet2_piece_3)
    with BuildSketch(Plane(origin=(34.196819666, -18.024639165, -18.2), x_dir=(0, 0, 1), z_dir=(-1, 0, 0))) as fillet2_piece_4_section:
        with BuildLine():
            CenterArc((FILLET2_R, -FILLET2_R), FILLET2_R, 90, 90)
            Line((0, -FILLET2_R), (0, 0))
            Line((0, 0), (FILLET2_R, 0))
        make_face()
    fillet2_piece_4 = extrude(amount=25, mode=Mode.PRIVATE)
    fillet2_piece_4 = split(fillet2_piece_4, bisect_by=Plane(origin=(11.446819666, -18.024639165, -18.2), z_dir=(-1, 0, 0)), keep=Keep.TOP, mode=Mode.PRIVATE)
    fillet2_piece_4 = split(fillet2_piece_4, bisect_by=Plane(origin=(34.196819666, -21.024639165, -18.2), z_dir=(0, 1, 0)), keep=Keep.TOP, mode=Mode.PRIVATE)
    add(fillet2_piece_4)
    with BuildSketch(Plane(origin=(34.196819666, -18.024639165, -18.2), x_dir=(0, 0, 1), z_dir=(-1, 0, 0))) as fillet2_piece_5_section:
        with BuildLine():
            CenterArc((FILLET2_R, -FILLET2_R), FILLET2_R, 90, 90)
            Line((0, -FILLET2_R), (0, 0))
            Line((0, 0), (FILLET2_R, 0))
        make_face()
    fillet2_piece_5 = extrude(amount=25, mode=Mode.PRIVATE)
    fillet2_piece_5 = split(fillet2_piece_5, bisect_by=Plane(origin=(11.446819666, -18.024639165, -18.2), z_dir=(-1, 0, 0)), keep=Keep.TOP, mode=Mode.PRIVATE)
    fillet2_piece_5 = split(fillet2_piece_5, bisect_by=Plane(origin=(34.196819666, -21.024639165, -18.2), z_dir=(0, -1, 0)), keep=Keep.TOP, mode=Mode.PRIVATE)
    add(fillet2_piece_5)
    # the kernel refuses this fillet: 4 mm, written as the material it takes off along each edge
    with BuildSketch(Plane(origin=(-0.803180334, -10.024639165, -28.2), x_dir=(0, 0, 1), z_dir=(1, 0, 0))) as fillet2_2_piece_1:
        with BuildLine():
            CenterArc((FILLET2_R, FILLET2_R), FILLET2_R, 180, 90)
            Line((0, FILLET2_R), (0, 0))
            Line((0, 0), (FILLET2_R, 0))
        make_face()
    extrude(amount=45, mode=Mode.SUBTRACT)

    # Sketch45 → Cut-Extrude26 (cut, through all)
    with BuildSketch(Plane(origin=(0, 0, -11.7), x_dir=(-1, 0, 0), z_dir=(0, 0, -1))):
        Polygon((-55.696819666, -18.024639165), (-34.196819666, -18.024639165), (-34.196819666, -10.024639165), (-9.196819666, -10.024639165), (-9.196819666, -18.024639165), (43.303180334, -18.024639165), (43.303180334, 21.275360835), (-55.696819666, 21.275360835), align=None)
    extrude(amount=-CUT_EXTRUDE26_DEPTH, mode=Mode.SUBTRACT)

    # Sketch49 → Boss-Extrude7 (add)
    with BuildSketch(Plane(origin=(0, 0, -28.2), x_dir=(-1, 0, 0), z_dir=(0, 0, -1))):
        with Locations((-31.696819666, -34.774639165)):
            Rectangle(SKETCH49_W, SKETCH49_H)
        with Locations((-12.696819666, -34.774639165)):
            Rectangle(SKETCH49_W_2, SKETCH49_H)
    extrude(amount=-BOSS_EXTRUDE7_DEPTH)

    # M4 Clearance Hole1 (through all)
    with Locations(Plane(origin=(0, -10.024639165, 0), x_dir=(1, 0, 0), z_dir=(0, 1, 0))):
        with Locations((16.396819666, 6), (28.396819666, 6)):
            Hole(M4_CLEARANCE_HOLE1_D / 2)

    # Sketch48 → Cut-Extrude27 (cut)
    with BuildSketch(Plane.XZ.offset(18.024639165)):
        Polygon((18.489714392, -9.625), (20.582609118, -6), (18.489714392, -2.375), (14.30392494, -2.375), (12.211030214, -6), (14.30392494, -9.625), align=None)
        Polygon((30.489714392, -9.625), (32.582609118, -6), (30.489714392, -2.375), (26.30392494, -2.375), (24.211030214, -6), (26.30392494, -9.625), align=None)
    extrude(amount=-CUT_EXTRUDE27_DEPTH, mode=Mode.SUBTRACT)

    # Sketch52 → Boss-Extrude9 (add)
    with BuildSketch(Plane(origin=(34.196819666, 0, 0), x_dir=(0, 0, -1), z_dir=(1, 0, 0))):
        with BuildLine():
            Line((11.85, -10.024639165), (11.85, -18.024639165))
            Line((11.85, -18.024639165), (14.2, -18.024639165))
            ThreePointArc((14.2, -18.024639165), (17.028427125, -19.19621204), (18.2, -22.024639165))
            Line((18.2, -22.024639165), (18.2, -36.524639165))
            Line((18.2, -36.524639165), (28.2, -36.524639165))
            Line((28.2, -36.524639165), (28.2, -14.024639165))
            ThreePointArc((28.2, -14.024639165), (27.028427125, -11.19621204), (24.2, -10.024639165))
            Line((24.2, -10.024639165), (11.85, -10.024639165))
        make_face()
    extrude(amount=BOSS_EXTRUDE9_DEPTH)

    # Chamfer2: read off the stored shape, not the designer's step
    # Chamfer2 outline → Chamfer2 (cut)
    with BuildSketch(Plane.YZ.offset(CHAMFER2_START)):
        with BuildLine():
            Line((-21.024639165, -18.072983346), (-21.024639165, -21.470497278))
            Line((-21.024639165, -21.470497278), (-19.411423781, -17.228383291))
            ThreePointArc((-19.411423781, -17.228383291), (-20.169330925, -17.743703054), (-21.024639165, -18.072983346))
        make_face()
    extrude(amount=CHAMFER2_DEPTH, mode=Mode.SUBTRACT)

    # Sketch52<2> → Boss-Extrude10 (add)
    with BuildSketch(Plane(origin=(34.196819666, 0, 0), x_dir=(0, 0, -1), z_dir=(1, 0, 0)).offset(BOSS_EXTRUDE10_START)):
        with BuildLine():
            Line((24.2, -10.024639165), (11.85, -10.024639165))
            Line((11.85, -10.024639165), (11.85, -18.024639165))
            Line((11.85, -18.024639165), (14.2, -18.024639165))
            ThreePointArc((14.2, -18.024639165), (17.028427125, -19.19621204), (18.2, -22.024639165))
            Line((18.2, -22.024639165), (18.2, -36.524639165))
            Line((18.2, -36.524639165), (28.2, -36.524639165))
            Line((28.2, -36.524639165), (28.2, -14.024639165))
            ThreePointArc((28.2, -14.024639165), (27.028427125, -11.19621204), (24.2, -10.024639165))
        make_face()
    extrude(amount=-BOSS_EXTRUDE10_DEPTH)

    # Fillet3
    fillet3_edges = [cut_extrude17_piece_1.edges().sort_by_distance(p)[0] for p in [
        (37.196819666, -36.524639165, -23.2),
        (8.196819666, -36.524639165, -23.2),
    ]]
    fillet(fillet3_edges, radius=FILLET3_R)


with BuildPart() as cut_extrude17_piece_2:
    # of the separate pieces the step leaves, piece 2, a body of its own (cut_extrude17_pieces)
    add(part.part.solids().sort_by_distance((34.896819666, 29.275360835, 0))[0])


with BuildPart() as cut_extrude17_piece_3:
    # of the separate pieces the step leaves, piece 3, a body of its own (cut_extrude17_pieces)
    add(part.part.solids().sort_by_distance((-43.303180334, 29.275360835, 0))[0])


with BuildPart() as cut_extrude20_tool:
    # Sketch32 → Cut-Extrude20 (new, through all)
    with BuildSketch(Plane(origin=(0, 0, -11.7), x_dir=(-1, 0, 0), z_dir=(0, 0, -1))):
        with Locations((-6.196819666, 25.275360835)):
            Rectangle(SKETCH32_W, SKETCH32_H)
    extrude(amount=-CUT_EXTRUDE20_DEPTH)


with BuildPart() as cut_extrude17_piece_2_1:
    add(cut_extrude17_piece_2.part)

    # Cut-Extrude20: cut by cut_extrude20_tool
    add(cut_extrude20_tool.part, mode=Mode.SUBTRACT)


with BuildPart() as cut_extrude17_piece_3_1:
    add(cut_extrude17_piece_3.part)

    # Cut-Extrude20: cut by cut_extrude20_tool
    add(cut_extrude20_tool.part, mode=Mode.SUBTRACT)


solid = cut_extrude17_piece_1.part
